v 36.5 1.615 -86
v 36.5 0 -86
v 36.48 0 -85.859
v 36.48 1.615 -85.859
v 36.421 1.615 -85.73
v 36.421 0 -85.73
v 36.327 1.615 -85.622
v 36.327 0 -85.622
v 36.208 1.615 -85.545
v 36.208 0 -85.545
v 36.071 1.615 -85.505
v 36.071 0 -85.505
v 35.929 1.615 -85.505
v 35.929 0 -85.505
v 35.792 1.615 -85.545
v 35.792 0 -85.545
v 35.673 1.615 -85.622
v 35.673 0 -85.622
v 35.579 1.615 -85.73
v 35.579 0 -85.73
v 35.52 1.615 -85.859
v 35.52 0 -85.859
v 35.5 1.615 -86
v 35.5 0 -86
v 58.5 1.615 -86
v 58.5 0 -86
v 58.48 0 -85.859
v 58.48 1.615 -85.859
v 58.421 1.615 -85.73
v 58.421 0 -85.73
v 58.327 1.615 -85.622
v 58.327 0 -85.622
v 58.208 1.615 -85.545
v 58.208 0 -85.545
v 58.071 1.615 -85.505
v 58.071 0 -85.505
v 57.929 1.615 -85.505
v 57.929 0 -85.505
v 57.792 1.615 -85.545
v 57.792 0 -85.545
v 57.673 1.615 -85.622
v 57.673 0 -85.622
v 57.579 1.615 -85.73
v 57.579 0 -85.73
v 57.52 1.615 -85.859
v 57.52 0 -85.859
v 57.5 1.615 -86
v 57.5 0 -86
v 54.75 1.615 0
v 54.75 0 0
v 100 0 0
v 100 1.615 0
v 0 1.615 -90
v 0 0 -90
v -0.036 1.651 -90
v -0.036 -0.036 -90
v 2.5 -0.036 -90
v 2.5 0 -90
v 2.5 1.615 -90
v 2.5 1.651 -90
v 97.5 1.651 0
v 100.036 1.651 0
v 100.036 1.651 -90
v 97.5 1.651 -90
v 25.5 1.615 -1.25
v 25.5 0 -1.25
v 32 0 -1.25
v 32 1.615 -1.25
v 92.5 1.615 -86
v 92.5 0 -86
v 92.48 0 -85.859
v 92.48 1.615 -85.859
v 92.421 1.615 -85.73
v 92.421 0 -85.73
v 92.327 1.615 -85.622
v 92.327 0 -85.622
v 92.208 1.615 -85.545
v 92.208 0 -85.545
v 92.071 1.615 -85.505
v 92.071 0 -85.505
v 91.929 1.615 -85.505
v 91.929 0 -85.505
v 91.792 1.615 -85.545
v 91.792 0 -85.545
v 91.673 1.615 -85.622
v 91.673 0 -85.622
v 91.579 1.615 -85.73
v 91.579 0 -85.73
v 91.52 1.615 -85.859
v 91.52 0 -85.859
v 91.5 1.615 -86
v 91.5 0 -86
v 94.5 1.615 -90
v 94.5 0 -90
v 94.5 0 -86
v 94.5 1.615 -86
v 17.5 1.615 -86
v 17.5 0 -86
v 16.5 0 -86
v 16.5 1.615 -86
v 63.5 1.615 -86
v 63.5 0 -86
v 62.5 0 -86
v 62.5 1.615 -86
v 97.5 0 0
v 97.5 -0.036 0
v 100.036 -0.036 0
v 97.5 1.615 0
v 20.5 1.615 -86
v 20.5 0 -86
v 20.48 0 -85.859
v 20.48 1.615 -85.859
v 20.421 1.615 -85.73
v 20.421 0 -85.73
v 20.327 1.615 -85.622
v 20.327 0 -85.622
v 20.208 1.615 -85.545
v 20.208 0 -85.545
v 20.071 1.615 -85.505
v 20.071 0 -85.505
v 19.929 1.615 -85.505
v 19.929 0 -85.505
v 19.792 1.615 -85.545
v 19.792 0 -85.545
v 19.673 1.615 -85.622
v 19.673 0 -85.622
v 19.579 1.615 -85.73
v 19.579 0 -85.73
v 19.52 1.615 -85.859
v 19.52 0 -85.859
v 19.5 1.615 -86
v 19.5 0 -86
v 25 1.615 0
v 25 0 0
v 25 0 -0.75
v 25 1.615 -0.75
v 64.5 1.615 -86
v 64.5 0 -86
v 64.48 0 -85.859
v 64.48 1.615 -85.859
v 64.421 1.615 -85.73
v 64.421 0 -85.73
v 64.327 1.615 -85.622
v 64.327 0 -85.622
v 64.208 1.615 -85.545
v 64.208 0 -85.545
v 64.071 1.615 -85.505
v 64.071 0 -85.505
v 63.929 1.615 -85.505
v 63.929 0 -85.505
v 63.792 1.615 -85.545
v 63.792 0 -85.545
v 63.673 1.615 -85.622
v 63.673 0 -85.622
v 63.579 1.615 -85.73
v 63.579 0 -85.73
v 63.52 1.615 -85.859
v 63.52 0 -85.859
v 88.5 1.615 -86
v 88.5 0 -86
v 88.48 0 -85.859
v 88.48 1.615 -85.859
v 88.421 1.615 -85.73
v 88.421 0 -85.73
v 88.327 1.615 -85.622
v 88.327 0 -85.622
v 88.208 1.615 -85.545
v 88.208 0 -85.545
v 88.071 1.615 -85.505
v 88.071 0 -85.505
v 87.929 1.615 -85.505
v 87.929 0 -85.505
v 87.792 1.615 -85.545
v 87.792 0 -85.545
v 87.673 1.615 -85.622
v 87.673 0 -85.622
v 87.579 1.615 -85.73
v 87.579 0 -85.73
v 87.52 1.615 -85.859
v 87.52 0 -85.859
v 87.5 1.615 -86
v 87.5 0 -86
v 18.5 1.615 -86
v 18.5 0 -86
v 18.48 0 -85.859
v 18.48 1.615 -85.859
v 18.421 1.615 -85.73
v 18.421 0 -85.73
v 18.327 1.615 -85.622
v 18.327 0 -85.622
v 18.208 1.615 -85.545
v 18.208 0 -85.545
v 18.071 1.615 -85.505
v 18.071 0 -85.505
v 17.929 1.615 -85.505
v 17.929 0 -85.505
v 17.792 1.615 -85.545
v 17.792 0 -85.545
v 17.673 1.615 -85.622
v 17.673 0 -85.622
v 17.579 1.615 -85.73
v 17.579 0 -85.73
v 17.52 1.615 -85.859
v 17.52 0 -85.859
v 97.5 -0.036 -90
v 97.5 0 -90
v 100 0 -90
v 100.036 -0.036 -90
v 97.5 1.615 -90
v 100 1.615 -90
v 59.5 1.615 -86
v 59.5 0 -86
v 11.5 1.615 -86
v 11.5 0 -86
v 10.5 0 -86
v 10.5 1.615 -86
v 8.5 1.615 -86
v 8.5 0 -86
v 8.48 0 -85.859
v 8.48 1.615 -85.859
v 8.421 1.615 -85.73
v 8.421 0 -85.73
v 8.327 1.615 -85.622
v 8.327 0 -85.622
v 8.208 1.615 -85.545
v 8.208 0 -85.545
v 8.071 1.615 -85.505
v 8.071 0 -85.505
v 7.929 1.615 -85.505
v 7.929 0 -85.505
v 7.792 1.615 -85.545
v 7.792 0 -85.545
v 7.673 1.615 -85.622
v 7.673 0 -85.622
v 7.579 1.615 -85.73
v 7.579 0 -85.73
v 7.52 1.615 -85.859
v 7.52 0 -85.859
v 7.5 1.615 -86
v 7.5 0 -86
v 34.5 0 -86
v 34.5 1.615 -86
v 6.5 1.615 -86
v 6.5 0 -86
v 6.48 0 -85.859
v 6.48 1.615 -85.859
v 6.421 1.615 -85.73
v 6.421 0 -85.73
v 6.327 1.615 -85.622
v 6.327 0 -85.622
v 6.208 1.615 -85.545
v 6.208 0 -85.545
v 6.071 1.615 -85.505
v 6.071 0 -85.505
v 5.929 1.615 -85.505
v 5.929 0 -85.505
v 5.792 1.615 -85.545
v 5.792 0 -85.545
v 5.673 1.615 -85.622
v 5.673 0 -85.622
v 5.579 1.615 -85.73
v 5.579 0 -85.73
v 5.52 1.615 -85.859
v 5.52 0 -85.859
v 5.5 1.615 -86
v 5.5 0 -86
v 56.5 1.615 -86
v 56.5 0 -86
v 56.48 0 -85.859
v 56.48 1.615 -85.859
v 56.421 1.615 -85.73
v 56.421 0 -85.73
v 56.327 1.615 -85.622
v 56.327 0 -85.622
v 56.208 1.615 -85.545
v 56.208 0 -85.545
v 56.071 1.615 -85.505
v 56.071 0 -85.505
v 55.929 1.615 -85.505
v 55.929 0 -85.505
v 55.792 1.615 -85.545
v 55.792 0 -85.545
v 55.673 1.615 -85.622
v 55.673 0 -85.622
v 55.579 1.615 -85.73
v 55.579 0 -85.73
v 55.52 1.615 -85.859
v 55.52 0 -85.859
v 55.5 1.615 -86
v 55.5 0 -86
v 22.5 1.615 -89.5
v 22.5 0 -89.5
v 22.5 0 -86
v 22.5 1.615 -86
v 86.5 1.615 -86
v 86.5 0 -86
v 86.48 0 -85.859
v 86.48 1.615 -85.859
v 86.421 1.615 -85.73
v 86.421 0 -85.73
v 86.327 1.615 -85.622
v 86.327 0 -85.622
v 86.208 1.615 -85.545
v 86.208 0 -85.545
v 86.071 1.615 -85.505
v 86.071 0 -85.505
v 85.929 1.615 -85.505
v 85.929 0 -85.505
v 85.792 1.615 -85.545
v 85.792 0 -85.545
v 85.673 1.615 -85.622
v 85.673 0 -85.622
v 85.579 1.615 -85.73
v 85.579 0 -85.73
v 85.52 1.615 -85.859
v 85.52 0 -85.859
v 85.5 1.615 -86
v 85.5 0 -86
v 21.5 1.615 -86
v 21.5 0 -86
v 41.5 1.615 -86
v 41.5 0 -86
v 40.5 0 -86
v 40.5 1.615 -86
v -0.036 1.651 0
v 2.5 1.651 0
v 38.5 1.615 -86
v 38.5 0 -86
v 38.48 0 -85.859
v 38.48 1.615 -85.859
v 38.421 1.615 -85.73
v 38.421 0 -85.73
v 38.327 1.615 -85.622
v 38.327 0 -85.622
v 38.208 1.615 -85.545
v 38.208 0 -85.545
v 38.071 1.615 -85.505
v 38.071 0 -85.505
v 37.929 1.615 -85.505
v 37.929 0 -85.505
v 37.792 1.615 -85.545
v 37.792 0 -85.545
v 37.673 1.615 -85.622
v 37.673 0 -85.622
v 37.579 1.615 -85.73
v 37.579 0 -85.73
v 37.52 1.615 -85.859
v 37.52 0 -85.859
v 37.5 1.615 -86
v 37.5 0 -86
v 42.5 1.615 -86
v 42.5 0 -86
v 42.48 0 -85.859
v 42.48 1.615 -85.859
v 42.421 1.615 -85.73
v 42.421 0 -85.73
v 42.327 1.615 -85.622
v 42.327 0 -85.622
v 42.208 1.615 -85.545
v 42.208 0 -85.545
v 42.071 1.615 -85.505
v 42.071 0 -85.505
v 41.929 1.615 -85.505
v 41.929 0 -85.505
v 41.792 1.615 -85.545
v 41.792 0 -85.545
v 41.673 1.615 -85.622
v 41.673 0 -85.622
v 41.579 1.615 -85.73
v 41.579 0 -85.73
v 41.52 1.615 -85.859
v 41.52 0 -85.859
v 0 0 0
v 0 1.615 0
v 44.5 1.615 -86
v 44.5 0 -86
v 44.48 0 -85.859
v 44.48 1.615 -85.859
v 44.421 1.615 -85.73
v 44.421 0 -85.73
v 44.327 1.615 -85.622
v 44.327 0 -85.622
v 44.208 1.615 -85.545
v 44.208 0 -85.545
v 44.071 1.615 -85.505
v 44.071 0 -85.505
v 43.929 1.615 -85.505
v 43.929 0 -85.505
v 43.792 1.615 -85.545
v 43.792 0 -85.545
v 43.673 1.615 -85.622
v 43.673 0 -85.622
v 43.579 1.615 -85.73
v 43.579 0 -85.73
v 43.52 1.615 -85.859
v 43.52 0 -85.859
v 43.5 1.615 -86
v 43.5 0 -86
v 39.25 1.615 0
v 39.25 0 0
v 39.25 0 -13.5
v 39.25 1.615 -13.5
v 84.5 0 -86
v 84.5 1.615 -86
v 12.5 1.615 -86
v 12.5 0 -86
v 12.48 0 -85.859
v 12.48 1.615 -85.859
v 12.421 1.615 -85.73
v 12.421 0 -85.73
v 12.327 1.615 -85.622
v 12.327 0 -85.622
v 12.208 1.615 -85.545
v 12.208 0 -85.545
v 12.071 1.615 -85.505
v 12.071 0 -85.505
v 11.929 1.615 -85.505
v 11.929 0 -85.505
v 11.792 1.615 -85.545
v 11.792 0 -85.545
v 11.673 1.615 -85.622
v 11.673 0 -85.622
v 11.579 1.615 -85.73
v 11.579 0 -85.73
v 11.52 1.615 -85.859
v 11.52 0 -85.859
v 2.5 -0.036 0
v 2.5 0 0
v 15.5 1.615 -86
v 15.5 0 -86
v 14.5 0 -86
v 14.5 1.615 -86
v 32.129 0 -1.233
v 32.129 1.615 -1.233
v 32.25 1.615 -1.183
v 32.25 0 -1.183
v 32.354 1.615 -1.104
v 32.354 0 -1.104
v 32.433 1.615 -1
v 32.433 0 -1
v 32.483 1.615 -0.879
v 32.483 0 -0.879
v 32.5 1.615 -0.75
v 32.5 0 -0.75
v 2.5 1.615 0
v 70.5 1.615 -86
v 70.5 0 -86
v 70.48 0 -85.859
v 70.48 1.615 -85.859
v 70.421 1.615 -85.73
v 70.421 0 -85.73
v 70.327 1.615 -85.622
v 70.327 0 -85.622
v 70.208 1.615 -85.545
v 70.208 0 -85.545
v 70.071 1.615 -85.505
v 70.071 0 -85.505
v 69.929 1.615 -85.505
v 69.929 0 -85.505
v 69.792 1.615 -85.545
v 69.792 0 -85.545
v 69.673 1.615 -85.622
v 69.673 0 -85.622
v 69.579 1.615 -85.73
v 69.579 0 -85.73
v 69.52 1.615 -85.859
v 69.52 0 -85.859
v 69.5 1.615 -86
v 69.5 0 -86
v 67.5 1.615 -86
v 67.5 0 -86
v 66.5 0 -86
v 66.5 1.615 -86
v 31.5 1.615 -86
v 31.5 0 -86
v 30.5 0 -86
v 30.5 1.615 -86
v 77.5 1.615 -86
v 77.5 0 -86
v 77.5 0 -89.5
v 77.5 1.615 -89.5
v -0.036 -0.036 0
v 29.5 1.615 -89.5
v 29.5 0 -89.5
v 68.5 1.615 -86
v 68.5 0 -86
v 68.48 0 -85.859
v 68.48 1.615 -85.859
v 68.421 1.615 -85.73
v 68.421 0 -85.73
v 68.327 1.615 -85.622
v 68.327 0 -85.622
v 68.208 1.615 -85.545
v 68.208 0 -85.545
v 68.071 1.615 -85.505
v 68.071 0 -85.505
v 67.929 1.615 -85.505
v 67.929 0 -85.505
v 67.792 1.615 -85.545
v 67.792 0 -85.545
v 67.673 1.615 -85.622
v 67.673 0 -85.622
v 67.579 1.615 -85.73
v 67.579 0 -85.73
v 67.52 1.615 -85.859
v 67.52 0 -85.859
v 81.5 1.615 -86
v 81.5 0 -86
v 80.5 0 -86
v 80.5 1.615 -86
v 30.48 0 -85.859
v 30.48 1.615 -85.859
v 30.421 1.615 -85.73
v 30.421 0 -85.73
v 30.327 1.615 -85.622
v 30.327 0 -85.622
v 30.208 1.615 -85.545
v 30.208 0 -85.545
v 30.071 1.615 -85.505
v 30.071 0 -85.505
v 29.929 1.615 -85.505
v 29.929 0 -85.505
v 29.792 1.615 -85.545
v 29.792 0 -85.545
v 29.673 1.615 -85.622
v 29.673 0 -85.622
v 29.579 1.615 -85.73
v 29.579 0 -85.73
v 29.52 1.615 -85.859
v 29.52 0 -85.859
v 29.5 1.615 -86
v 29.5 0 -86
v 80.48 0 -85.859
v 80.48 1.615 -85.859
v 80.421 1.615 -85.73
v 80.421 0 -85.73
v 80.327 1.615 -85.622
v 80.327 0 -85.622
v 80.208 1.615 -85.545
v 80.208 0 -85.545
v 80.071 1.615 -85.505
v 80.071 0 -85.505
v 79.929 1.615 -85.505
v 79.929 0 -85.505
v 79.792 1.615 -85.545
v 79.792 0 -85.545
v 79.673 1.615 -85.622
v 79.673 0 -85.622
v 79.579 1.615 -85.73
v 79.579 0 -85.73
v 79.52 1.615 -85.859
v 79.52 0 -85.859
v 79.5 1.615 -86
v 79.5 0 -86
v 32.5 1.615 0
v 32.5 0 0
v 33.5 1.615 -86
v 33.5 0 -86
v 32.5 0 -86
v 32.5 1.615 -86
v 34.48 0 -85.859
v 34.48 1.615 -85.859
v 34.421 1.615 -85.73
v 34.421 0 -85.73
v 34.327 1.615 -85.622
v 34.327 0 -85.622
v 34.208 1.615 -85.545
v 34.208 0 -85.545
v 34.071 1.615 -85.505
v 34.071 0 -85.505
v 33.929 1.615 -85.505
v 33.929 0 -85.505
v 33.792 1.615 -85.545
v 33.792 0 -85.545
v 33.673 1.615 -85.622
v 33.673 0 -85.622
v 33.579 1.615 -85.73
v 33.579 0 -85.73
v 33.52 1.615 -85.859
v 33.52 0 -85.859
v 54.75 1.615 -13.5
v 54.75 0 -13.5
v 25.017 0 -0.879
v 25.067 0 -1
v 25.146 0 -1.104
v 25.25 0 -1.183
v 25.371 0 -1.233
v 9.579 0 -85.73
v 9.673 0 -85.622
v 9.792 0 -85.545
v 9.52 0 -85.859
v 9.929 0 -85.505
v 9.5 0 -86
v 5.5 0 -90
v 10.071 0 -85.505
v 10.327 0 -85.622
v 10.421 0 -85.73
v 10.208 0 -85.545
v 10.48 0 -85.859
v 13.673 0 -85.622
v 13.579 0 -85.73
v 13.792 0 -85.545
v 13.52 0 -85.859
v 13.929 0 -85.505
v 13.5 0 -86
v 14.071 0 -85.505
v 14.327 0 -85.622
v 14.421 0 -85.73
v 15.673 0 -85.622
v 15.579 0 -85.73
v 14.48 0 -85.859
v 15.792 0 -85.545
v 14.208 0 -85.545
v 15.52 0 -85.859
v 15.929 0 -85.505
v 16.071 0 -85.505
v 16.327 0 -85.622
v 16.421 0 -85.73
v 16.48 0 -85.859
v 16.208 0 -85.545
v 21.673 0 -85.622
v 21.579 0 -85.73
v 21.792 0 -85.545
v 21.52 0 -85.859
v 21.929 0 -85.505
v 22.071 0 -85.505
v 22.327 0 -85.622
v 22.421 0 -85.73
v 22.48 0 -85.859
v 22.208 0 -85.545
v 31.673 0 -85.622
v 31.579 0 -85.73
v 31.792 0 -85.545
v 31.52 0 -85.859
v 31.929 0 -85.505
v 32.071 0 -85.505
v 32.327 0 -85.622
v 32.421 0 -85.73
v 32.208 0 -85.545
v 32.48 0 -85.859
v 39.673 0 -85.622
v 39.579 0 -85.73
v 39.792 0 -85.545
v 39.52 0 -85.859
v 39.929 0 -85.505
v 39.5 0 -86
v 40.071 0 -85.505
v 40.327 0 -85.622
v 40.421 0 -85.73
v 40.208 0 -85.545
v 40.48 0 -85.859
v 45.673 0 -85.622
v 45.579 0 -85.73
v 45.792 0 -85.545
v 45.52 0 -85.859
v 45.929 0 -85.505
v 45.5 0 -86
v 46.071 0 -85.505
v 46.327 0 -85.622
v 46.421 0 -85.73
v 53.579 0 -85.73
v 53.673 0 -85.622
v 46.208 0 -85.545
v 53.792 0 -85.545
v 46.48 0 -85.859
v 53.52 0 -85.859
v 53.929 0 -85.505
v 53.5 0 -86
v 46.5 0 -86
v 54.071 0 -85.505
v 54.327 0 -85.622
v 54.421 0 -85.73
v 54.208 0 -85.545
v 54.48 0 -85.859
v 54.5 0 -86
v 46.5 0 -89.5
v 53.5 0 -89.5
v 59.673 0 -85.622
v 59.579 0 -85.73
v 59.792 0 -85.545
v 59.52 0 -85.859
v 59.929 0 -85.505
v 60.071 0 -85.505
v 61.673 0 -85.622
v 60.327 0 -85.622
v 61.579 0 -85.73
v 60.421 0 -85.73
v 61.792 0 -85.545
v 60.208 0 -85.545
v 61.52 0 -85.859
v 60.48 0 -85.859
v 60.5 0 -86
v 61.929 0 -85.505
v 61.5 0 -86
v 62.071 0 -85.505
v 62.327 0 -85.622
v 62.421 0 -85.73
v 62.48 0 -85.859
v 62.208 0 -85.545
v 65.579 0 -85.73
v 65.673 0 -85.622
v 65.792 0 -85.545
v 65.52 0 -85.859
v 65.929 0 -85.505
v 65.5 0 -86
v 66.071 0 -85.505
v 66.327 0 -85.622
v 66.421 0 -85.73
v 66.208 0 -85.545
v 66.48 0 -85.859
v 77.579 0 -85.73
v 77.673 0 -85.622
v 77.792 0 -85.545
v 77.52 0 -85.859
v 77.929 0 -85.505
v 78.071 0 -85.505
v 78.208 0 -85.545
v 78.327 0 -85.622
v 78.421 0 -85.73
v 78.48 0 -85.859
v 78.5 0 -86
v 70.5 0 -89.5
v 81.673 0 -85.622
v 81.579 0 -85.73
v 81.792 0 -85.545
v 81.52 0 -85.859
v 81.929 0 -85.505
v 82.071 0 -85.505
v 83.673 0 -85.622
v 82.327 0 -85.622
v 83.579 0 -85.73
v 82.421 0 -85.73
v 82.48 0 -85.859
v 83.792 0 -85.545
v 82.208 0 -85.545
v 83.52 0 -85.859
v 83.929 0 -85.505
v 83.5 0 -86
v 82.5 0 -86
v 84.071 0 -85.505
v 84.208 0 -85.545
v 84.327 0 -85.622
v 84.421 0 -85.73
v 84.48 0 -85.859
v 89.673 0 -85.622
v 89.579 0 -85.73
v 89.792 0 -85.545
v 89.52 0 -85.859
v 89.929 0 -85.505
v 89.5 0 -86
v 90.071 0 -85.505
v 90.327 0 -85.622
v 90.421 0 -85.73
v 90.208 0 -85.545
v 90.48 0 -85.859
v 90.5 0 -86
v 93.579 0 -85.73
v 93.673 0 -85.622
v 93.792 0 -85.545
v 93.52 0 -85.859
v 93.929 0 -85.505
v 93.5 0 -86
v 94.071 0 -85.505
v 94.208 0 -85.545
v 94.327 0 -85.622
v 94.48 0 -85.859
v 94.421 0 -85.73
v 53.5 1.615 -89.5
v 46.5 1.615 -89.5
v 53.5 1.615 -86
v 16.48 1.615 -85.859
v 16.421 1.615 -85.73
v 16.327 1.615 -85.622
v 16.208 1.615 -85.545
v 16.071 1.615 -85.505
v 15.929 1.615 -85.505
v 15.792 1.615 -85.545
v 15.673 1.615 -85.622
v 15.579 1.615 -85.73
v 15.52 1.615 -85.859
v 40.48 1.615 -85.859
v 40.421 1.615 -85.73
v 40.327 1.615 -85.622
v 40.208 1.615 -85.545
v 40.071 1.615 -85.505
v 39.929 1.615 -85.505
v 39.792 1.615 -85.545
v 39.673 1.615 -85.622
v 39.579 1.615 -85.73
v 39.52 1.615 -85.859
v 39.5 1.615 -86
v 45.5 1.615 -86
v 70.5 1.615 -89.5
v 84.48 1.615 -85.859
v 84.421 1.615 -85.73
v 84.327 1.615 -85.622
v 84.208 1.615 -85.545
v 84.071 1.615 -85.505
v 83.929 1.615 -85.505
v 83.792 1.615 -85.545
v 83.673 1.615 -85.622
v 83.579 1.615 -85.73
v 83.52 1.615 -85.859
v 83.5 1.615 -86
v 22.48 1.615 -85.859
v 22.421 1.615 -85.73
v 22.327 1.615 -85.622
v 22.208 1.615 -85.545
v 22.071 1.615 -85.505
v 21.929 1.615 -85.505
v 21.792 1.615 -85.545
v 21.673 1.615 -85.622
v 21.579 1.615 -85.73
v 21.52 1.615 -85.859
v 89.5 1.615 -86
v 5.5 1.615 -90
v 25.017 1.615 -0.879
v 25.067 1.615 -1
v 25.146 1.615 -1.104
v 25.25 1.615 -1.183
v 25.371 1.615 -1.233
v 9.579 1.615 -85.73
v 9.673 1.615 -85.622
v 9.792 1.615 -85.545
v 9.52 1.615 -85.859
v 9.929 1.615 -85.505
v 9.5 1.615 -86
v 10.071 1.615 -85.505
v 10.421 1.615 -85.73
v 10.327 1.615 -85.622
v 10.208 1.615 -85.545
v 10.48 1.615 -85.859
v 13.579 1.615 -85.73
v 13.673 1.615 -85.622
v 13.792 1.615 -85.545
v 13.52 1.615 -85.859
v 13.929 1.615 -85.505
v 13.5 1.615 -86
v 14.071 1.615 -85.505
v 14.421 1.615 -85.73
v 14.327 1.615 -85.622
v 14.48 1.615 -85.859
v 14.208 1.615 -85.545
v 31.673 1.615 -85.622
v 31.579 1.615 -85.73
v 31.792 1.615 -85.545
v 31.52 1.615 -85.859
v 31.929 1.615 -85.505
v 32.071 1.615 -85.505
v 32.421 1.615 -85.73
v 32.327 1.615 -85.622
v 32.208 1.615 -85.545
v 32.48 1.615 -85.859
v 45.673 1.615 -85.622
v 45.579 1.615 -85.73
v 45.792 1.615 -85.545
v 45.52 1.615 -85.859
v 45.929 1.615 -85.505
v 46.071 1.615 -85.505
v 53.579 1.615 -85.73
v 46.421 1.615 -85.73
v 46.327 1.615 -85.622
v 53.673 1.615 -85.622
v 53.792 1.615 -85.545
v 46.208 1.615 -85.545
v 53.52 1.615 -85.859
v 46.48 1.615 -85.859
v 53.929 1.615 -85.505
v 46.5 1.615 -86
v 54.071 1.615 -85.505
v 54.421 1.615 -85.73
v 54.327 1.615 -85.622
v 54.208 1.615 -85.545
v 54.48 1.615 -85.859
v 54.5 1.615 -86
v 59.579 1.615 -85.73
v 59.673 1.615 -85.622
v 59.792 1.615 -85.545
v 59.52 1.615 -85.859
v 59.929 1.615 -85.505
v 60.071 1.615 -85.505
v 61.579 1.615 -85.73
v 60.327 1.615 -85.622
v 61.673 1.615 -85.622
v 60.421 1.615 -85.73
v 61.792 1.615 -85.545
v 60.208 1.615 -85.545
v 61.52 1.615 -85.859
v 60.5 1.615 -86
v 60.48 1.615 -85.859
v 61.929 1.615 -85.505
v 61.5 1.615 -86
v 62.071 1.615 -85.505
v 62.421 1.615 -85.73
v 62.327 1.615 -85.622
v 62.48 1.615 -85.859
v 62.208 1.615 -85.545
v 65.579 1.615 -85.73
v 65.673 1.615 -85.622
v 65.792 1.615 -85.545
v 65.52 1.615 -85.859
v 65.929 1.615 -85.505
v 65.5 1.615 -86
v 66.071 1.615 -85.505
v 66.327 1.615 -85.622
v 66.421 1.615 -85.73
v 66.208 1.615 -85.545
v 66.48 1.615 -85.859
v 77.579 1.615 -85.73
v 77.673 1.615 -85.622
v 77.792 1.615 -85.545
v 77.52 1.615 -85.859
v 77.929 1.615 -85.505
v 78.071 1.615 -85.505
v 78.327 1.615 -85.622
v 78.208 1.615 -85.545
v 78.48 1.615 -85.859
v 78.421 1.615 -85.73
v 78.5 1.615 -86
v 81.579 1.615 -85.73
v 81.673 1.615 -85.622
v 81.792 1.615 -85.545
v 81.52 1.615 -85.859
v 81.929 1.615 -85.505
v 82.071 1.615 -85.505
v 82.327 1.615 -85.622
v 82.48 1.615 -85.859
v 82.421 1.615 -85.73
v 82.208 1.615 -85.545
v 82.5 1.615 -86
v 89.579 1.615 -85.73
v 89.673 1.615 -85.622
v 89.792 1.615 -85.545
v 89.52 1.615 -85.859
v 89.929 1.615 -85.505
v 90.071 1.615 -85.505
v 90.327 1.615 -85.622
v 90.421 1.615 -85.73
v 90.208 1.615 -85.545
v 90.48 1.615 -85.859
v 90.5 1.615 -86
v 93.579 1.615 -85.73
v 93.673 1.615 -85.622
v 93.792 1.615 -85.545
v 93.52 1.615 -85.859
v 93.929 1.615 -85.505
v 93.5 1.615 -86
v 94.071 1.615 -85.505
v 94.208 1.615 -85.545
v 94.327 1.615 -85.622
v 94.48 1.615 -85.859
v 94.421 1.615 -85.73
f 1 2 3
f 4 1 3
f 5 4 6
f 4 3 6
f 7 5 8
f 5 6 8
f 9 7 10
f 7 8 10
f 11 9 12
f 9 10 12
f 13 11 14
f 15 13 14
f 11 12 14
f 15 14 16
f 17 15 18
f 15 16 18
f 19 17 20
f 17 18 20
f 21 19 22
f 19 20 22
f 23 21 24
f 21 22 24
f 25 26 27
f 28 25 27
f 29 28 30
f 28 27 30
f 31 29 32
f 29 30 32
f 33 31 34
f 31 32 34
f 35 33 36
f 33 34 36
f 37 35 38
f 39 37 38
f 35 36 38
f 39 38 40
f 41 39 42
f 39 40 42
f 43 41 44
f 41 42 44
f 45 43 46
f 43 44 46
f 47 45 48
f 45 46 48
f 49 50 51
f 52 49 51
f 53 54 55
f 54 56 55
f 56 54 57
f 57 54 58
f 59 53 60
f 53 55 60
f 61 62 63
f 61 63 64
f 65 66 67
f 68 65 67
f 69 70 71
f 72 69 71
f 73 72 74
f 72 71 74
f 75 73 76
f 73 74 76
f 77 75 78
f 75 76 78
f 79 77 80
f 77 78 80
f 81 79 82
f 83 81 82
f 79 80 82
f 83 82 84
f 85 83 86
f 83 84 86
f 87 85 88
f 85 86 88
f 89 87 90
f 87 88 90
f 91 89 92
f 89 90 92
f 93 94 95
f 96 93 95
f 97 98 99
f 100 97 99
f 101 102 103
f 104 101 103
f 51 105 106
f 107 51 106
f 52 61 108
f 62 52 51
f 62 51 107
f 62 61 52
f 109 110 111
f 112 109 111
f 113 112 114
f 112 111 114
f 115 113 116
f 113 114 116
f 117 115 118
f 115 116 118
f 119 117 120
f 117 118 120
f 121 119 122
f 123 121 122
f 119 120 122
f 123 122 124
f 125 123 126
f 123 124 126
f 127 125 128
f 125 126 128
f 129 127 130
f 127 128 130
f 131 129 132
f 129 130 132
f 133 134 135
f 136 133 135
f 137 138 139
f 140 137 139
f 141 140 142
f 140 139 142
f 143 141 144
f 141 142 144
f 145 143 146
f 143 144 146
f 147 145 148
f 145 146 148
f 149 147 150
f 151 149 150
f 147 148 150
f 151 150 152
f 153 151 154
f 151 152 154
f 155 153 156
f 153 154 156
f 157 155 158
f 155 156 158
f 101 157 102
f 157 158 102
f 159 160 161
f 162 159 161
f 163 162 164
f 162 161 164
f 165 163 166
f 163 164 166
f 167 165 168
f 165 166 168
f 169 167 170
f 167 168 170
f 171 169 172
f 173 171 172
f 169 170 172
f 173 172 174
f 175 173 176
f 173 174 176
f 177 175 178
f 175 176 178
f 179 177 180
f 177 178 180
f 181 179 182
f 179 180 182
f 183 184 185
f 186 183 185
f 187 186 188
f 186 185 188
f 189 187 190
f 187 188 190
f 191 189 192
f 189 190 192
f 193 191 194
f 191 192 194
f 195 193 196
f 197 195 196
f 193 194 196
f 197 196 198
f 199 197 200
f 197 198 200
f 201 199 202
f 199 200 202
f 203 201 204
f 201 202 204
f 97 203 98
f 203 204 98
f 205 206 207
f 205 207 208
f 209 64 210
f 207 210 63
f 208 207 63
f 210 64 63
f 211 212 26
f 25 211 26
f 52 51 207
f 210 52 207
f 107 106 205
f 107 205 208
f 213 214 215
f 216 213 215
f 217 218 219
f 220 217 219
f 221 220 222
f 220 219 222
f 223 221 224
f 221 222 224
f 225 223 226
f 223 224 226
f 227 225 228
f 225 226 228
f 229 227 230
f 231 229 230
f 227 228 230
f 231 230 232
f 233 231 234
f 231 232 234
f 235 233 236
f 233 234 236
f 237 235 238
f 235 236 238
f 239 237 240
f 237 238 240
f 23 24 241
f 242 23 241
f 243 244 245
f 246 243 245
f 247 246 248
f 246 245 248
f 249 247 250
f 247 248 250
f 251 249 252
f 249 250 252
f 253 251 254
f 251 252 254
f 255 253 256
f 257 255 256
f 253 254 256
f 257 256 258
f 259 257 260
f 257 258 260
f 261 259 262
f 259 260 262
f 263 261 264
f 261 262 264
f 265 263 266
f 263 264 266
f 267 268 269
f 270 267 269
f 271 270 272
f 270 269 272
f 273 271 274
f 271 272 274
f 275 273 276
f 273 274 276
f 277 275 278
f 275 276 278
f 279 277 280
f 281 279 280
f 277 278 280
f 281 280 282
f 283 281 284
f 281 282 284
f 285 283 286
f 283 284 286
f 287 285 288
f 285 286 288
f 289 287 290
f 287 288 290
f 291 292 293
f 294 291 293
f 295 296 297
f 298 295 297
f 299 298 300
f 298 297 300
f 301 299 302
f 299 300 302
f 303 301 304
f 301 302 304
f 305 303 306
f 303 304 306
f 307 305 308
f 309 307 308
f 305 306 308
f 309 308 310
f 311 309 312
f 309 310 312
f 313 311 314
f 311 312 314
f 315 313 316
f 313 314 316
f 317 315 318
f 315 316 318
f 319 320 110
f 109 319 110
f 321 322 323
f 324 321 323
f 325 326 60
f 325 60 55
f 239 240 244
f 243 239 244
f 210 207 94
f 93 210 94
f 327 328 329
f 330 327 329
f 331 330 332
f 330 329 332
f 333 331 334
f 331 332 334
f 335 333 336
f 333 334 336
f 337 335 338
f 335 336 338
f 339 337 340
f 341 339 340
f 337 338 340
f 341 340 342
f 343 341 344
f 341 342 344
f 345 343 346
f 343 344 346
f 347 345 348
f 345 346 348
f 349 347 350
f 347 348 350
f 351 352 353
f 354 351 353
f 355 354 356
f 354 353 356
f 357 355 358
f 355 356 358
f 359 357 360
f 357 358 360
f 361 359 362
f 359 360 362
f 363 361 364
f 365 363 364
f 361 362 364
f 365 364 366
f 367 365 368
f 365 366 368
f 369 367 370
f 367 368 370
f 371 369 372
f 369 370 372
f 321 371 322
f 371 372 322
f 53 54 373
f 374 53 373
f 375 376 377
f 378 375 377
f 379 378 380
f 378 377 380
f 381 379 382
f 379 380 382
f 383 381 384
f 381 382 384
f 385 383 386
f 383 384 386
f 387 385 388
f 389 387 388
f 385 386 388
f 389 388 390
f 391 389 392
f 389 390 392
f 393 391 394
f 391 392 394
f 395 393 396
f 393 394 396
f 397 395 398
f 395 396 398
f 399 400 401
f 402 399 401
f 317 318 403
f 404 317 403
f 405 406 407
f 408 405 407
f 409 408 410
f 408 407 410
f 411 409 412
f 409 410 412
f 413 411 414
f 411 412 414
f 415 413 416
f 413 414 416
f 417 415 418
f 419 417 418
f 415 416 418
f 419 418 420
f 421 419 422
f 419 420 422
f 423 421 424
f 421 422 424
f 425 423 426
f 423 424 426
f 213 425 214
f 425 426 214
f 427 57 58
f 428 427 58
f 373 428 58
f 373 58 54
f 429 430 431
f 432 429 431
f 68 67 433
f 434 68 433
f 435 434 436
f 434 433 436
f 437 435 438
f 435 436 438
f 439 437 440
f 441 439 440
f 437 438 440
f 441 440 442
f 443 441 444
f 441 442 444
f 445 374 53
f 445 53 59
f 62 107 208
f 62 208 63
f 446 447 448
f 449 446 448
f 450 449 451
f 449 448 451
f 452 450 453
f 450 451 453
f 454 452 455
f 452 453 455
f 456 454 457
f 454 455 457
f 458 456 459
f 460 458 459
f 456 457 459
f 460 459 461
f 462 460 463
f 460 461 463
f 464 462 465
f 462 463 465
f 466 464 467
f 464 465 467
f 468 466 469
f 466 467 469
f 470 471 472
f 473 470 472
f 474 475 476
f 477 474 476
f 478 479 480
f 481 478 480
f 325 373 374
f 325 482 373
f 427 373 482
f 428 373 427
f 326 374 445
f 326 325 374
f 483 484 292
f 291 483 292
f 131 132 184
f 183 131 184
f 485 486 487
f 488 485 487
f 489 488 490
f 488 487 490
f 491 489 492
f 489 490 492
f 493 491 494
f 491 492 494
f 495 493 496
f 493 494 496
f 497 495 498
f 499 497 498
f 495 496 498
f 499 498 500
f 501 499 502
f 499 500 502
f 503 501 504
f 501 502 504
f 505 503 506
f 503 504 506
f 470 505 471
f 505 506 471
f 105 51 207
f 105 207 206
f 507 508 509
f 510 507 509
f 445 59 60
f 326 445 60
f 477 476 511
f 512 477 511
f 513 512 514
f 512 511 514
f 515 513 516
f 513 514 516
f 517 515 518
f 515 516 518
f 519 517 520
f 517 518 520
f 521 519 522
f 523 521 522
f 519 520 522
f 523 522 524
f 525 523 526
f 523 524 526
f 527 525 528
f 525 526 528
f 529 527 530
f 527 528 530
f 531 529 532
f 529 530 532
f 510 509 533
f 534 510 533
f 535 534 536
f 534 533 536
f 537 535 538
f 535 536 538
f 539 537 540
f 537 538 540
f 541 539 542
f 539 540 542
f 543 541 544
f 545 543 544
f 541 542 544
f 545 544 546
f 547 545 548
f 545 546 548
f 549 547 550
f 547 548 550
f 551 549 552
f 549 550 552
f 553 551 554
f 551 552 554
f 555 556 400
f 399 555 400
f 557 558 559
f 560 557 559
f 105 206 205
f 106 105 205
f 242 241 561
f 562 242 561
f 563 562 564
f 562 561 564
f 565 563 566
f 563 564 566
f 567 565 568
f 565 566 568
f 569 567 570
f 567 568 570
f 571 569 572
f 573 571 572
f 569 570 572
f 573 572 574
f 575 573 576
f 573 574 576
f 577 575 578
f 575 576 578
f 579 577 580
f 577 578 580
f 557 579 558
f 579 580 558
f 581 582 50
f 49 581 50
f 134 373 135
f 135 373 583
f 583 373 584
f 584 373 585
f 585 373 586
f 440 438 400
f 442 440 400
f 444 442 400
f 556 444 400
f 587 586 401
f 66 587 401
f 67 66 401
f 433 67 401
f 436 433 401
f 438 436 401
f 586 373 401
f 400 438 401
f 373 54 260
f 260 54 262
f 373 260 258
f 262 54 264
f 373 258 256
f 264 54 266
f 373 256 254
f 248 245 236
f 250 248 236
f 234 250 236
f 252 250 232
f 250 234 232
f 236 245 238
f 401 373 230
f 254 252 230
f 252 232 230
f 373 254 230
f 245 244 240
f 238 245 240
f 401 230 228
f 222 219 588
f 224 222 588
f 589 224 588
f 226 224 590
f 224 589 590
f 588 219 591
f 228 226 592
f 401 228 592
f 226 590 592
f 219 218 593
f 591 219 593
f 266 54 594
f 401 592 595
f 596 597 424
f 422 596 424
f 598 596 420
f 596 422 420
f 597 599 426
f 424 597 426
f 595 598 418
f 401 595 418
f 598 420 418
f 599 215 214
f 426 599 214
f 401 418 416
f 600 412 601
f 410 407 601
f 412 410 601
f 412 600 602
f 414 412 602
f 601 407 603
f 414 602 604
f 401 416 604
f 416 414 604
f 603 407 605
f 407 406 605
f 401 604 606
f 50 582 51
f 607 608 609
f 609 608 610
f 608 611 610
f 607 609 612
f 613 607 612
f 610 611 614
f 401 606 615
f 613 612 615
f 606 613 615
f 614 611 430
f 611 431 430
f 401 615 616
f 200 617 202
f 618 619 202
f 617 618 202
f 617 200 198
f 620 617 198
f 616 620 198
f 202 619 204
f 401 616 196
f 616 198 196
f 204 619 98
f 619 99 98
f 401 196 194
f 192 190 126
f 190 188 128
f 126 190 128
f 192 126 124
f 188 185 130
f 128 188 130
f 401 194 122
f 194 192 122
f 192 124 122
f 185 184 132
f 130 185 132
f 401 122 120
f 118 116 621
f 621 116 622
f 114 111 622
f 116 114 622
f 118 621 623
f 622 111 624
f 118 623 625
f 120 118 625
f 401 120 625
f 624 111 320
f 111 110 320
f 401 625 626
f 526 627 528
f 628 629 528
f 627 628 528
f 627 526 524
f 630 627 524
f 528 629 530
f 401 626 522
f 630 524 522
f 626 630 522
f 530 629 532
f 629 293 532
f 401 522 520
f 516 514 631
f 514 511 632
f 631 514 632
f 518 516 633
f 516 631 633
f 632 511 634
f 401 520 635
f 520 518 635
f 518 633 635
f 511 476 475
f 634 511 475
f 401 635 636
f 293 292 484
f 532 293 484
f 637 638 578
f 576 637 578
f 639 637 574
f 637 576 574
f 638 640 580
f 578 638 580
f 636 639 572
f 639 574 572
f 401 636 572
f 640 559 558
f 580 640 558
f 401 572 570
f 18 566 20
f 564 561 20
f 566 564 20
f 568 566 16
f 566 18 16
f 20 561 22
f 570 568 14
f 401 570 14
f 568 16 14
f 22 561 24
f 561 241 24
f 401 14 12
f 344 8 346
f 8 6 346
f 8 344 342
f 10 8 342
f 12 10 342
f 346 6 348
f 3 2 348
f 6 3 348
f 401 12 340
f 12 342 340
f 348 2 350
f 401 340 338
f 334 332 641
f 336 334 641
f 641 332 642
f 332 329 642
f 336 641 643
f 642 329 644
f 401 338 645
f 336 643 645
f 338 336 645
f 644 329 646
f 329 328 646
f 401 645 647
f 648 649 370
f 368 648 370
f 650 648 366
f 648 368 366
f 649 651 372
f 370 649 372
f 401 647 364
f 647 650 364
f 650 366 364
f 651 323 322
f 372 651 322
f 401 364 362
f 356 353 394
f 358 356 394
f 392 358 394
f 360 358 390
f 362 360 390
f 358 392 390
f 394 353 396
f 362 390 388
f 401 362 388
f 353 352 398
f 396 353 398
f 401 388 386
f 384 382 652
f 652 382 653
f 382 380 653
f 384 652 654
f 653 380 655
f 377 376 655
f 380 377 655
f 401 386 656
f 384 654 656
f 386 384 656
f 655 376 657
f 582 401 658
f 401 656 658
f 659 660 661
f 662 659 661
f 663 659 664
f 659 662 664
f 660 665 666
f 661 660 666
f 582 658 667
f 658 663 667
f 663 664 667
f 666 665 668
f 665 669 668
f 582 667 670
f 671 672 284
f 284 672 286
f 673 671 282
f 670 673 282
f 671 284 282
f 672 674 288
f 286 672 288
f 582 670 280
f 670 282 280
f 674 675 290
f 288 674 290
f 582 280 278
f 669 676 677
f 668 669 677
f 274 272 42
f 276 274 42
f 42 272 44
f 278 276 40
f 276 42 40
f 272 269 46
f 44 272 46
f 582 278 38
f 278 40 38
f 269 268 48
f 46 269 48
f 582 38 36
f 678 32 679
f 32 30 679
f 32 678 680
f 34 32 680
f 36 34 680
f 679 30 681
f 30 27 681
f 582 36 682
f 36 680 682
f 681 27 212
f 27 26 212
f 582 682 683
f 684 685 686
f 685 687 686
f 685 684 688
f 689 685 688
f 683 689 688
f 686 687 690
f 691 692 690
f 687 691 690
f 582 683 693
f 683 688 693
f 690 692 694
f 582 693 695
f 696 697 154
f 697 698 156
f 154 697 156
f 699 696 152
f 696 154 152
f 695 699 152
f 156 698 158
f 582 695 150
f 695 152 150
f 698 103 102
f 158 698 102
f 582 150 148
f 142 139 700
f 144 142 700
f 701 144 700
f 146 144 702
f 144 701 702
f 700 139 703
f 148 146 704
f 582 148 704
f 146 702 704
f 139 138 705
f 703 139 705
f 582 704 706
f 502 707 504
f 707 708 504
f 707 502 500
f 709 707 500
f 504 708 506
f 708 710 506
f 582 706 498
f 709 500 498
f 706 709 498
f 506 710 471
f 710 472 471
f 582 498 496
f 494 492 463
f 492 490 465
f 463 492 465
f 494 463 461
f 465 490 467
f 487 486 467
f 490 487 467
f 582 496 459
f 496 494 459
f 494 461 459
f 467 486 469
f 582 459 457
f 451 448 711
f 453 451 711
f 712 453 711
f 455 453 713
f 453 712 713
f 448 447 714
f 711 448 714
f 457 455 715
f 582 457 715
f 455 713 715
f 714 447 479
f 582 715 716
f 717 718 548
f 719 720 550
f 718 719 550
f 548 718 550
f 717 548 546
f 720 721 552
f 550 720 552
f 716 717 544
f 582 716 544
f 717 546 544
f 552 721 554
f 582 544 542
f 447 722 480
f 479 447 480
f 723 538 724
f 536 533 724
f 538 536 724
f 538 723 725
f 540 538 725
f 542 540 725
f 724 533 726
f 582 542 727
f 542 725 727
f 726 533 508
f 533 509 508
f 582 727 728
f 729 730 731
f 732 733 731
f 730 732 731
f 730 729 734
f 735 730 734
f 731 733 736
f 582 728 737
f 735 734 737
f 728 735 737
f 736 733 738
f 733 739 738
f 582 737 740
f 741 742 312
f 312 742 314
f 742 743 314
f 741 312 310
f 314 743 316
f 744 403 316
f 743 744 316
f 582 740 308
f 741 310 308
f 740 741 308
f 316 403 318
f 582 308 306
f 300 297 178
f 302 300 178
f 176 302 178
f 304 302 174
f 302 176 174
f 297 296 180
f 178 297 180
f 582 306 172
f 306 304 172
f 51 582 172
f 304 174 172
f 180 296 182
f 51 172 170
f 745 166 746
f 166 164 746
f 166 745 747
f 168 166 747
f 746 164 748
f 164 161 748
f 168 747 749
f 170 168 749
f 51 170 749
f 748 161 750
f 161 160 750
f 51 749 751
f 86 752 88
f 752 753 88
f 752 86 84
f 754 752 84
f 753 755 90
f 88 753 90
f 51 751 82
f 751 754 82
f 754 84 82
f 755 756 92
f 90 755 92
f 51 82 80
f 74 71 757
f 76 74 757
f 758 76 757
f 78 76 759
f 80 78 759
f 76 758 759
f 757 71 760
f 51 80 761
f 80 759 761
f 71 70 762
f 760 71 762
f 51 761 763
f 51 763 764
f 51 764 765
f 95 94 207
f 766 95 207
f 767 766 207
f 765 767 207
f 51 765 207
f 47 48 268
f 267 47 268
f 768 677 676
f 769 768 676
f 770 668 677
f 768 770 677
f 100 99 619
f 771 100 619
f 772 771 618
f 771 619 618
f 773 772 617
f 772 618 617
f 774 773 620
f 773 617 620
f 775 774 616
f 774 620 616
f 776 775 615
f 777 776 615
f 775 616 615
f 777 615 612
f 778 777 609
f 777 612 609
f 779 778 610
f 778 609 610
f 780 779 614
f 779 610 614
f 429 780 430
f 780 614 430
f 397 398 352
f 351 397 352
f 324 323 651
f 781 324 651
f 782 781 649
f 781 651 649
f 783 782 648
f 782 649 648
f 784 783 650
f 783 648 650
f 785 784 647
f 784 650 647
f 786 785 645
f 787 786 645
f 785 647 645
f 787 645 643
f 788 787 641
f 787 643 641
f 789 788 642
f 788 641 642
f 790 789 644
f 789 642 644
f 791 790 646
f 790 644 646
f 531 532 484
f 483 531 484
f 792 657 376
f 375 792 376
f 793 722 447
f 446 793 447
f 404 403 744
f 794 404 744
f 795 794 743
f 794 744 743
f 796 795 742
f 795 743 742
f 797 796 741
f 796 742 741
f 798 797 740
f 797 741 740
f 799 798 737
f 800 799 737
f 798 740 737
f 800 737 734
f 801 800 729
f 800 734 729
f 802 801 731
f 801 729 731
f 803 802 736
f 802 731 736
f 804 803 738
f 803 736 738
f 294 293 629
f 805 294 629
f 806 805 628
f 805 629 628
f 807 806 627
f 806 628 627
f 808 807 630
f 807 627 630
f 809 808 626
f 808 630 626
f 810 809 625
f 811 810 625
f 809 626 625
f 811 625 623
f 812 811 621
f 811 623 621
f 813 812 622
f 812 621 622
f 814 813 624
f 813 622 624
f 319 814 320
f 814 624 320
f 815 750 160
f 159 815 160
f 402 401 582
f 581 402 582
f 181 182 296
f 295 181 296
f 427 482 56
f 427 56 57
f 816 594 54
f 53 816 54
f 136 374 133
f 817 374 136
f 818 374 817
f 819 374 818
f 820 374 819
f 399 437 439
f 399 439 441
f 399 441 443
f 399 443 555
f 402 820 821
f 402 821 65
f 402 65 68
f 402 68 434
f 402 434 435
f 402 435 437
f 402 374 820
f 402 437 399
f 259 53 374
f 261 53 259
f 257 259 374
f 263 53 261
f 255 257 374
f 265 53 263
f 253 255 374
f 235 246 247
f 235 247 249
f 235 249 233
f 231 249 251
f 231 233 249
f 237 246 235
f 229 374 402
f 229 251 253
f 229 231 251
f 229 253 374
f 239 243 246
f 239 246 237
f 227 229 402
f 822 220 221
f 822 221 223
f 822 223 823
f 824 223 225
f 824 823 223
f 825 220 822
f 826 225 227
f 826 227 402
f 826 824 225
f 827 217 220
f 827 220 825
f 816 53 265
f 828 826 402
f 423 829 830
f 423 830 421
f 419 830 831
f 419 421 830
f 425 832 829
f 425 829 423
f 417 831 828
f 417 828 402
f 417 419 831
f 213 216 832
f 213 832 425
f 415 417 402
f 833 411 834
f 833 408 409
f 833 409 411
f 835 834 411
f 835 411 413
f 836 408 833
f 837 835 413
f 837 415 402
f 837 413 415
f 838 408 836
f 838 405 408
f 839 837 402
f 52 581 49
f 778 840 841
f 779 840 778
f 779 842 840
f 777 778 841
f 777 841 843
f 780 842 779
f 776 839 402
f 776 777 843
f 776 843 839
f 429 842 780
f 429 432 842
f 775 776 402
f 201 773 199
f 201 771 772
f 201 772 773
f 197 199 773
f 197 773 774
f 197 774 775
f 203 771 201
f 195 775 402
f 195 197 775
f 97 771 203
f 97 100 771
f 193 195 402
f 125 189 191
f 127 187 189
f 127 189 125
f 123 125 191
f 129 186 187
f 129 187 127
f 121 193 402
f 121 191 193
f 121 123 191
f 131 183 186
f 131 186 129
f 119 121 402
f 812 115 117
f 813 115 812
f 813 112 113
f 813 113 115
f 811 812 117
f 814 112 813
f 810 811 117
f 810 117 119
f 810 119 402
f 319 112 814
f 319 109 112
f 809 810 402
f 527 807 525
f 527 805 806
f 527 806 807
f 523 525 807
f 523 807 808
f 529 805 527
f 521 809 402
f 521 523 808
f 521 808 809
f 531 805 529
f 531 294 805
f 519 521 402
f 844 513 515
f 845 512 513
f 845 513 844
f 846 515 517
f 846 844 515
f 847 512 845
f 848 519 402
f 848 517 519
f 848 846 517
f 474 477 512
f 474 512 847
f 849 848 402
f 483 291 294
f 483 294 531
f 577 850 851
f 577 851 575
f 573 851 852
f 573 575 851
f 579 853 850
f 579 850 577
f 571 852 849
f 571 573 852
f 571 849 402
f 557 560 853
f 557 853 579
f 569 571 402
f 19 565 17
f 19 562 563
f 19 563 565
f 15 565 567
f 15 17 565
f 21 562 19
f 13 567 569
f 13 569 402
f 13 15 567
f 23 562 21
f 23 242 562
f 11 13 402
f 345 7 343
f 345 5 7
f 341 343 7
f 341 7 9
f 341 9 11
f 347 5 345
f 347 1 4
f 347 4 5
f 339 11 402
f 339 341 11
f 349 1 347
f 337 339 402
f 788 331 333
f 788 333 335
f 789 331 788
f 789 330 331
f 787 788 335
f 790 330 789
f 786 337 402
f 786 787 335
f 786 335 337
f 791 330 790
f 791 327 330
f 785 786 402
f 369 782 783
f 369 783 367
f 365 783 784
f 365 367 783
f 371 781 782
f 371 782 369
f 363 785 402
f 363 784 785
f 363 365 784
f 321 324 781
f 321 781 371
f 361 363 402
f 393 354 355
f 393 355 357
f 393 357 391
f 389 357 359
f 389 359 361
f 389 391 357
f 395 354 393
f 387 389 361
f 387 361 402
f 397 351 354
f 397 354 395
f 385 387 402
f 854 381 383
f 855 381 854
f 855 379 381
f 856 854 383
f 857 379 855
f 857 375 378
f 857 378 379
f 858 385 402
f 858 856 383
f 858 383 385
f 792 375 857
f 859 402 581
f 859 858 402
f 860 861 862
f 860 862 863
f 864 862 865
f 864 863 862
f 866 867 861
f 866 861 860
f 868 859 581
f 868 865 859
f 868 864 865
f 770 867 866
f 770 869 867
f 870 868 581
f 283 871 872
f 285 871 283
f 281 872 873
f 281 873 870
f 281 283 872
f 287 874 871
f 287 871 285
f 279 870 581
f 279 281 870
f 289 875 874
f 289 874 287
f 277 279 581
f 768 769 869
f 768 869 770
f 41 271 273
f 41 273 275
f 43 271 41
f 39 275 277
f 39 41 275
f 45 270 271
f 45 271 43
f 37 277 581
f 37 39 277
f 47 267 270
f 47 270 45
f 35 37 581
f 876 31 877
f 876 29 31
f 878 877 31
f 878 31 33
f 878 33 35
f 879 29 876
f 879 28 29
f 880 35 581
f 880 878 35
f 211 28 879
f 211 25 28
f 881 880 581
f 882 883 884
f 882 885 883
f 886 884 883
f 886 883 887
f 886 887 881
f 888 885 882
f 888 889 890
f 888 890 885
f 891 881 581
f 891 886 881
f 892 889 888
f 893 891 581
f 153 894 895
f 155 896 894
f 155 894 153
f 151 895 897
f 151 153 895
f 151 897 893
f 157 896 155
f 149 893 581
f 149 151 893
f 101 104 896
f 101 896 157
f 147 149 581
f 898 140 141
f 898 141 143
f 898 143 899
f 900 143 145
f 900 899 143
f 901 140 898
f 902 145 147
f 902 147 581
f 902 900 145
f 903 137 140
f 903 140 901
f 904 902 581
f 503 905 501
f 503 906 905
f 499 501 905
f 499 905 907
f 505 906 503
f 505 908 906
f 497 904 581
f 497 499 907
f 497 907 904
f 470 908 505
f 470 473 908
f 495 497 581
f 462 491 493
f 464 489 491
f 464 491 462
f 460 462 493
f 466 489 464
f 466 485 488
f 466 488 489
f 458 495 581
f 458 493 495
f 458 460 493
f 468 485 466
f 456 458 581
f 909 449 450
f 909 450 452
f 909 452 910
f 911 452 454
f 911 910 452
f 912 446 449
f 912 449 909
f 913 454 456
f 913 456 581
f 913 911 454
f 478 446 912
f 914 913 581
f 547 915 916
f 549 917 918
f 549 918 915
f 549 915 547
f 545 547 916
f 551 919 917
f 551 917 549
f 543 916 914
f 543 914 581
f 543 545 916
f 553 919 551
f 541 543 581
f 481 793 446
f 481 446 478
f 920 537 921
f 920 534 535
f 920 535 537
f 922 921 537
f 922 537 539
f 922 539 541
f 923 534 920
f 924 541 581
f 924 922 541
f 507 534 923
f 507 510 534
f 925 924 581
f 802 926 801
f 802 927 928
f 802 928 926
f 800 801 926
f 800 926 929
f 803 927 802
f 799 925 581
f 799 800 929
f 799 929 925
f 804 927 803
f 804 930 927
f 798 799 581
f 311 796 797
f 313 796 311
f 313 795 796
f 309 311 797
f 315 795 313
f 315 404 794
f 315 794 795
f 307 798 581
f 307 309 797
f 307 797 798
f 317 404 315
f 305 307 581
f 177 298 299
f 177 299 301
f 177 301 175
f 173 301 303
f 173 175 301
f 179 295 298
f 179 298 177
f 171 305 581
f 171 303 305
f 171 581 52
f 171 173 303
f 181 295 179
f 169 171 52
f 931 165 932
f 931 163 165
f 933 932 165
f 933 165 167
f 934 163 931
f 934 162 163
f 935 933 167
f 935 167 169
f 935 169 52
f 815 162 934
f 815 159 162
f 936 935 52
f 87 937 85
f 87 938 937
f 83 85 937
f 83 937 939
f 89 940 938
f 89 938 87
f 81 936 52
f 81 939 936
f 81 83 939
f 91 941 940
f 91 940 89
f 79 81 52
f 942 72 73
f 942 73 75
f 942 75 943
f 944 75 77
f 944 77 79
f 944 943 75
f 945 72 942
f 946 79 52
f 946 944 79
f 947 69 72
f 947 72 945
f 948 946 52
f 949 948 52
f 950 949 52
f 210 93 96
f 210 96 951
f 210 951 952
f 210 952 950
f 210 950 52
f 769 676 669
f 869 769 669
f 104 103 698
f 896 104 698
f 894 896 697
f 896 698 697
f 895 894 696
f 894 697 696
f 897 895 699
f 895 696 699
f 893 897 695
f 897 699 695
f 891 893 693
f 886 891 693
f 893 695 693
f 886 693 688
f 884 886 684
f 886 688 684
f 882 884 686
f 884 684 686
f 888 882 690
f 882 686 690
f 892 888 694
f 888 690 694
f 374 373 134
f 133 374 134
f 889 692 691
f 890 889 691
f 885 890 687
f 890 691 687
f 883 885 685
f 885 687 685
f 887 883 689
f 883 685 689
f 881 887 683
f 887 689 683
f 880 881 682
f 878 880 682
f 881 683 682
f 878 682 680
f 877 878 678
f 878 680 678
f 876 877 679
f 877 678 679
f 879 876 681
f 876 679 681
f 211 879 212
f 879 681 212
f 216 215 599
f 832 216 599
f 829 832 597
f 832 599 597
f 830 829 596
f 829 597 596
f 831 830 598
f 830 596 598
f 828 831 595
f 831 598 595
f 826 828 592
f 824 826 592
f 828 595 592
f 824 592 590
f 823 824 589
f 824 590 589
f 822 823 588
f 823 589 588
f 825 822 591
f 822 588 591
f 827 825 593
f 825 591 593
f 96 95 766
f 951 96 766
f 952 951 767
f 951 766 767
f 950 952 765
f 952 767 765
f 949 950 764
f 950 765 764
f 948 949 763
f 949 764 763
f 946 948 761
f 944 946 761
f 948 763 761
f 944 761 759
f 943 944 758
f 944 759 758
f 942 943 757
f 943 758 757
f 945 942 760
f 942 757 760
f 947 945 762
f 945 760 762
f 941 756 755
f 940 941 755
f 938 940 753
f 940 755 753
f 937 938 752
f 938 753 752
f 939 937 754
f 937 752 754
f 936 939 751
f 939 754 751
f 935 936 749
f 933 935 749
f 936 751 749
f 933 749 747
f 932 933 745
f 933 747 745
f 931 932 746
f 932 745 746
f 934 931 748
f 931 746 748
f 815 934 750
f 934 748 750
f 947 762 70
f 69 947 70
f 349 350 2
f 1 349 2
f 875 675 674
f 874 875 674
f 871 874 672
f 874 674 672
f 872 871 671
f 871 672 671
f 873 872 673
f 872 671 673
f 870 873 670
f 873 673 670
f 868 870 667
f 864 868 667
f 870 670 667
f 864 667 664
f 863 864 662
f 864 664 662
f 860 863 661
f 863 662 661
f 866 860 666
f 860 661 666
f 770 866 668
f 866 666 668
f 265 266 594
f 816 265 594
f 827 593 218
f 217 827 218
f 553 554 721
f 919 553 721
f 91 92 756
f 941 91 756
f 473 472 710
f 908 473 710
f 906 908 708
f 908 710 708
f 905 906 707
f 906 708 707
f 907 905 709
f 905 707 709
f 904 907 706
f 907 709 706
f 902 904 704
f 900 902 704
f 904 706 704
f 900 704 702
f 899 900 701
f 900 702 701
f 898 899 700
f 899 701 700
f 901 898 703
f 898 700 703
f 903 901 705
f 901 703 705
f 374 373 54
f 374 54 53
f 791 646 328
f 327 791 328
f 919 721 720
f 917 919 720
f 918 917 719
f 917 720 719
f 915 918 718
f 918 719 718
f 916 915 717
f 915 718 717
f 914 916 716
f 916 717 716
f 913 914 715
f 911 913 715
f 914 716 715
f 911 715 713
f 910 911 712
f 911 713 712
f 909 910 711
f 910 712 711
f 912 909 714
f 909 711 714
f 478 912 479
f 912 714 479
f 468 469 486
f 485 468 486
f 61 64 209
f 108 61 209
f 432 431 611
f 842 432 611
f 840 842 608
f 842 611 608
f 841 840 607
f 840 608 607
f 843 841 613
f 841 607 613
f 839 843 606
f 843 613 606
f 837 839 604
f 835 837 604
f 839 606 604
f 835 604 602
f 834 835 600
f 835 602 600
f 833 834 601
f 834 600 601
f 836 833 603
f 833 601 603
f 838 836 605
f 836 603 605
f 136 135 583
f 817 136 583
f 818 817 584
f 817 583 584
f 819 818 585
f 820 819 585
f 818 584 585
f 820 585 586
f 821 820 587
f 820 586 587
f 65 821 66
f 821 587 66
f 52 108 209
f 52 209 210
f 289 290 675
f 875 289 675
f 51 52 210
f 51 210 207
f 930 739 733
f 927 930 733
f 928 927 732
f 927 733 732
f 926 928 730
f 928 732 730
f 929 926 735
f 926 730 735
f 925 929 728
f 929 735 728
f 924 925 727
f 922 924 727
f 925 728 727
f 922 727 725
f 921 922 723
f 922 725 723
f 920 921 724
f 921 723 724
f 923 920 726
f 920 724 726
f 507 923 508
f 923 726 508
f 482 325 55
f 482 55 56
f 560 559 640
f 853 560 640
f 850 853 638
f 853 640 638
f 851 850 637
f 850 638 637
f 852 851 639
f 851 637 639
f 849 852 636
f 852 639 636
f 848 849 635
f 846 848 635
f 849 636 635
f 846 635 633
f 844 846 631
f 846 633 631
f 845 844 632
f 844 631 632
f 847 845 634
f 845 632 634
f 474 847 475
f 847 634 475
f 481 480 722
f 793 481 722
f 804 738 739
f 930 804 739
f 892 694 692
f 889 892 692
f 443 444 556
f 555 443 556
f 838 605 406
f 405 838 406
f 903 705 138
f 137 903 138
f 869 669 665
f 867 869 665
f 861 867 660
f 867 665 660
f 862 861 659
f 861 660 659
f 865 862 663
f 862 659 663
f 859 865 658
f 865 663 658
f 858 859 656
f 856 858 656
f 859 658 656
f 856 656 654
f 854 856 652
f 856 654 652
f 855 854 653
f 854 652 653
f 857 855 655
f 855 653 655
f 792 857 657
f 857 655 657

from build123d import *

# Parameters (mm, degrees)
FR4_DEPTH            = 1.61544
GOLD_PLATING_DEPTH   = 90
GOLD_PLATING_2_DEPTH = 90


with BuildPart() as part:
    # Sketch1 → FR4 (new body)
    with BuildSketch(Plane(origin=(0, 0, 0), x_dir=(1, 0, 0), z_dir=(0, 1, 0))):
        with BuildLine():
            Line((39.25, 0), (39.25, 13.5))
            Line((39.25, 13.5), (54.75, 13.5))
            Line((54.75, 13.5), (54.75, 0))
            Line((54.75, 0), (100, 0))
            Line((100, 0), (100, 90))
            Line((100, 90), (94.5, 90))
            Line((94.5, 90), (94.5, 86))
            ThreePointArc((94.5, 86), (94, 85.5), (93.5, 86))
            Line((93.5, 86), (92.5, 86))
            ThreePointArc((92.5, 86), (92, 85.5), (91.5, 86))
            Line((91.5, 86), (90.5, 86))
            ThreePointArc((90.5, 86), (90, 85.5), (89.5, 86))
            Line((89.5, 86), (88.5, 86))
            ThreePointArc((88.5, 86), (88, 85.5), (87.5, 86))
            Line((87.5, 86), (86.5, 86))
            ThreePointArc((86.5, 86), (86, 85.5), (85.5, 86))
            Line((85.5, 86), (84.5, 86))
            ThreePointArc((84.5, 86), (84, 85.5), (83.5, 86))
            Line((83.5, 86), (82.5, 86))
            ThreePointArc((82.5, 86), (82, 85.5), (81.5, 86))
            Line((81.5, 86), (80.5, 86))
            ThreePointArc((80.5, 86), (80, 85.5), (79.5, 86))
            Line((79.5, 86), (78.5, 86))
            ThreePointArc((78.5, 86), (78, 85.5), (77.5, 86))
            Line((77.5, 86), (77.5, 89.5))
            Line((77.5, 89.5), (70.5, 89.5))
            Line((70.5, 89.5), (70.5, 86))
            ThreePointArc((70.5, 86), (70, 85.5), (69.5, 86))
            Line((69.5, 86), (68.5, 86))
            ThreePointArc((68.5, 86), (68, 85.5), (67.5, 86))
            Line((67.5, 86), (66.5, 86))
            ThreePointArc((66.5, 86), (66, 85.5), (65.5, 86))
            Line((65.5, 86), (64.5, 86))
            ThreePointArc((64.5, 86), (64, 85.5), (63.5, 86))
            Line((63.5, 86), (62.5, 86))
            ThreePointArc((62.5, 86), (62, 85.5), (61.5, 86))
            Line((61.5, 86), (60.5, 86))
            ThreePointArc((60.5, 86), (60, 85.5), (59.5, 86))
            Line((59.5, 86), (58.5, 86))
            ThreePointArc((58.5, 86), (58, 85.5), (57.5, 86))
            Line((57.5, 86), (56.5, 86))
            ThreePointArc((56.5, 86), (56, 85.5), (55.5, 86))
            Line((55.5, 86), (54.5, 86))
            ThreePointArc((54.5, 86), (54, 85.5), (53.5, 86))
            Line((53.5, 86), (53.5, 89.5))
            Line((53.5, 89.5), (46.5, 89.5))
            Line((46.5, 89.5), (46.5, 86))
            ThreePointArc((46.5, 86), (46, 85.5), (45.5, 86))
            Line((45.5, 86), (44.5, 86))
            ThreePointArc((44.5, 86), (44, 85.5), (43.5, 86))
            Line((43.5, 86), (42.5, 86))
            ThreePointArc((42.5, 86), (42, 85.5), (41.5, 86))
            Line((41.5, 86), (40.5, 86))
            ThreePointArc((40.5, 86), (40, 85.5), (39.5, 86))
            Line((39.5, 86), (38.5, 86))
            ThreePointArc((38.5, 86), (38, 85.5), (37.5, 86))
            Line((37.5, 86), (36.5, 86))
            ThreePointArc((36.5, 86), (36, 85.5), (35.5, 86))
            Line((35.5, 86), (34.5, 86))
            ThreePointArc((34.5, 86), (34, 85.5), (33.5, 86))
            Line((33.5, 86), (32.5, 86))
            ThreePointArc((32.5, 86), (32, 85.5), (31.5, 86))
            Line((31.5, 86), (30.5, 86))
            ThreePointArc((30.5, 86), (30, 85.5), (29.5, 86))
            Line((29.5, 86), (29.5, 89.5))
            Line((29.5, 89.5), (22.5, 89.5))
            Line((22.5, 89.5), (22.5, 86))
            ThreePointArc((22.5, 86), (22, 85.5), (21.5, 86))
            Line((21.5, 86), (20.5, 86))
            ThreePointArc((20.5, 86), (20, 85.5), (19.5, 86))
            Line((19.5, 86), (18.5, 86))
            ThreePointArc((18.5, 86), (18, 85.5), (17.5, 86))
            Line((17.5, 86), (16.5, 86))
            ThreePointArc((16.5, 86), (16, 85.5), (15.5, 86))
            Line((15.5, 86), (14.5, 86))
            ThreePointArc((14.5, 86), (14, 85.5), (13.5, 86))
            Line((13.5, 86), (12.5, 86))
            ThreePointArc((12.5, 86), (12, 85.5), (11.5, 86))
            Line((11.5, 86), (10.5, 86))
            ThreePointArc((10.5, 86), (10, 85.5), (9.5, 86))
            Line((9.5, 86), (8.5, 86))
            ThreePointArc((8.5, 86), (8, 85.5), (7.5, 86))
            Line((7.5, 86), (6.5, 86))
            ThreePointArc((6.5, 86), (6, 85.5), (5.5, 86))
            Line((5.5, 86), (5.5, 90))
            Line((5.5, 90), (0, 90))
            Line((0, 90), (0, 0))
            Line((0, 0), (13.5, 0))
            Line((13.5, 0), (25, 0))
            Line((25, 0), (25, 0.75))
            ThreePointArc((25, 0.75), (25.146446609, 1.103553391), (25.5, 1.25))
            Line((25.5, 1.25), (32, 1.25))
            ThreePointArc((32, 1.25), (32.353553391, 1.103553391), (32.5, 0.75))
            Line((32.5, 0.75), (32.5, 0))
            Line((32.5, 0), (39.25, 0))
        make_face()
    extrude(amount=FR4_DEPTH)


with BuildPart() as body_2:
    # Sketch2 → gold-plating (new, through all)
    with BuildSketch(Plane.XY):
        Polygon((2.5, 1.61544), (2.5, 1.651), (-0.03556, 1.651), (-0.03556, -0.03556), (2.5, -0.03556), (2.5, 0), (0, 0), (0, 1.61544), align=None)
    extrude(amount=-GOLD_PLATING_DEPTH)


with BuildPart() as body_3:
    # Sketch2 → gold-plating 2 (new, through all)
    with BuildSketch(Plane.XY):
        Polygon((100, 1.61544), (100, 0), (97.5, 0), (97.5, -0.03556), (100.03556, -0.03556), (100.03556, 1.651), (97.5, 1.651), (97.5, 1.61544), align=None)
    extrude(amount=-GOLD_PLATING_2_DEPTH)


solid = Compound([part.part, body_2.part, body_3.part])
